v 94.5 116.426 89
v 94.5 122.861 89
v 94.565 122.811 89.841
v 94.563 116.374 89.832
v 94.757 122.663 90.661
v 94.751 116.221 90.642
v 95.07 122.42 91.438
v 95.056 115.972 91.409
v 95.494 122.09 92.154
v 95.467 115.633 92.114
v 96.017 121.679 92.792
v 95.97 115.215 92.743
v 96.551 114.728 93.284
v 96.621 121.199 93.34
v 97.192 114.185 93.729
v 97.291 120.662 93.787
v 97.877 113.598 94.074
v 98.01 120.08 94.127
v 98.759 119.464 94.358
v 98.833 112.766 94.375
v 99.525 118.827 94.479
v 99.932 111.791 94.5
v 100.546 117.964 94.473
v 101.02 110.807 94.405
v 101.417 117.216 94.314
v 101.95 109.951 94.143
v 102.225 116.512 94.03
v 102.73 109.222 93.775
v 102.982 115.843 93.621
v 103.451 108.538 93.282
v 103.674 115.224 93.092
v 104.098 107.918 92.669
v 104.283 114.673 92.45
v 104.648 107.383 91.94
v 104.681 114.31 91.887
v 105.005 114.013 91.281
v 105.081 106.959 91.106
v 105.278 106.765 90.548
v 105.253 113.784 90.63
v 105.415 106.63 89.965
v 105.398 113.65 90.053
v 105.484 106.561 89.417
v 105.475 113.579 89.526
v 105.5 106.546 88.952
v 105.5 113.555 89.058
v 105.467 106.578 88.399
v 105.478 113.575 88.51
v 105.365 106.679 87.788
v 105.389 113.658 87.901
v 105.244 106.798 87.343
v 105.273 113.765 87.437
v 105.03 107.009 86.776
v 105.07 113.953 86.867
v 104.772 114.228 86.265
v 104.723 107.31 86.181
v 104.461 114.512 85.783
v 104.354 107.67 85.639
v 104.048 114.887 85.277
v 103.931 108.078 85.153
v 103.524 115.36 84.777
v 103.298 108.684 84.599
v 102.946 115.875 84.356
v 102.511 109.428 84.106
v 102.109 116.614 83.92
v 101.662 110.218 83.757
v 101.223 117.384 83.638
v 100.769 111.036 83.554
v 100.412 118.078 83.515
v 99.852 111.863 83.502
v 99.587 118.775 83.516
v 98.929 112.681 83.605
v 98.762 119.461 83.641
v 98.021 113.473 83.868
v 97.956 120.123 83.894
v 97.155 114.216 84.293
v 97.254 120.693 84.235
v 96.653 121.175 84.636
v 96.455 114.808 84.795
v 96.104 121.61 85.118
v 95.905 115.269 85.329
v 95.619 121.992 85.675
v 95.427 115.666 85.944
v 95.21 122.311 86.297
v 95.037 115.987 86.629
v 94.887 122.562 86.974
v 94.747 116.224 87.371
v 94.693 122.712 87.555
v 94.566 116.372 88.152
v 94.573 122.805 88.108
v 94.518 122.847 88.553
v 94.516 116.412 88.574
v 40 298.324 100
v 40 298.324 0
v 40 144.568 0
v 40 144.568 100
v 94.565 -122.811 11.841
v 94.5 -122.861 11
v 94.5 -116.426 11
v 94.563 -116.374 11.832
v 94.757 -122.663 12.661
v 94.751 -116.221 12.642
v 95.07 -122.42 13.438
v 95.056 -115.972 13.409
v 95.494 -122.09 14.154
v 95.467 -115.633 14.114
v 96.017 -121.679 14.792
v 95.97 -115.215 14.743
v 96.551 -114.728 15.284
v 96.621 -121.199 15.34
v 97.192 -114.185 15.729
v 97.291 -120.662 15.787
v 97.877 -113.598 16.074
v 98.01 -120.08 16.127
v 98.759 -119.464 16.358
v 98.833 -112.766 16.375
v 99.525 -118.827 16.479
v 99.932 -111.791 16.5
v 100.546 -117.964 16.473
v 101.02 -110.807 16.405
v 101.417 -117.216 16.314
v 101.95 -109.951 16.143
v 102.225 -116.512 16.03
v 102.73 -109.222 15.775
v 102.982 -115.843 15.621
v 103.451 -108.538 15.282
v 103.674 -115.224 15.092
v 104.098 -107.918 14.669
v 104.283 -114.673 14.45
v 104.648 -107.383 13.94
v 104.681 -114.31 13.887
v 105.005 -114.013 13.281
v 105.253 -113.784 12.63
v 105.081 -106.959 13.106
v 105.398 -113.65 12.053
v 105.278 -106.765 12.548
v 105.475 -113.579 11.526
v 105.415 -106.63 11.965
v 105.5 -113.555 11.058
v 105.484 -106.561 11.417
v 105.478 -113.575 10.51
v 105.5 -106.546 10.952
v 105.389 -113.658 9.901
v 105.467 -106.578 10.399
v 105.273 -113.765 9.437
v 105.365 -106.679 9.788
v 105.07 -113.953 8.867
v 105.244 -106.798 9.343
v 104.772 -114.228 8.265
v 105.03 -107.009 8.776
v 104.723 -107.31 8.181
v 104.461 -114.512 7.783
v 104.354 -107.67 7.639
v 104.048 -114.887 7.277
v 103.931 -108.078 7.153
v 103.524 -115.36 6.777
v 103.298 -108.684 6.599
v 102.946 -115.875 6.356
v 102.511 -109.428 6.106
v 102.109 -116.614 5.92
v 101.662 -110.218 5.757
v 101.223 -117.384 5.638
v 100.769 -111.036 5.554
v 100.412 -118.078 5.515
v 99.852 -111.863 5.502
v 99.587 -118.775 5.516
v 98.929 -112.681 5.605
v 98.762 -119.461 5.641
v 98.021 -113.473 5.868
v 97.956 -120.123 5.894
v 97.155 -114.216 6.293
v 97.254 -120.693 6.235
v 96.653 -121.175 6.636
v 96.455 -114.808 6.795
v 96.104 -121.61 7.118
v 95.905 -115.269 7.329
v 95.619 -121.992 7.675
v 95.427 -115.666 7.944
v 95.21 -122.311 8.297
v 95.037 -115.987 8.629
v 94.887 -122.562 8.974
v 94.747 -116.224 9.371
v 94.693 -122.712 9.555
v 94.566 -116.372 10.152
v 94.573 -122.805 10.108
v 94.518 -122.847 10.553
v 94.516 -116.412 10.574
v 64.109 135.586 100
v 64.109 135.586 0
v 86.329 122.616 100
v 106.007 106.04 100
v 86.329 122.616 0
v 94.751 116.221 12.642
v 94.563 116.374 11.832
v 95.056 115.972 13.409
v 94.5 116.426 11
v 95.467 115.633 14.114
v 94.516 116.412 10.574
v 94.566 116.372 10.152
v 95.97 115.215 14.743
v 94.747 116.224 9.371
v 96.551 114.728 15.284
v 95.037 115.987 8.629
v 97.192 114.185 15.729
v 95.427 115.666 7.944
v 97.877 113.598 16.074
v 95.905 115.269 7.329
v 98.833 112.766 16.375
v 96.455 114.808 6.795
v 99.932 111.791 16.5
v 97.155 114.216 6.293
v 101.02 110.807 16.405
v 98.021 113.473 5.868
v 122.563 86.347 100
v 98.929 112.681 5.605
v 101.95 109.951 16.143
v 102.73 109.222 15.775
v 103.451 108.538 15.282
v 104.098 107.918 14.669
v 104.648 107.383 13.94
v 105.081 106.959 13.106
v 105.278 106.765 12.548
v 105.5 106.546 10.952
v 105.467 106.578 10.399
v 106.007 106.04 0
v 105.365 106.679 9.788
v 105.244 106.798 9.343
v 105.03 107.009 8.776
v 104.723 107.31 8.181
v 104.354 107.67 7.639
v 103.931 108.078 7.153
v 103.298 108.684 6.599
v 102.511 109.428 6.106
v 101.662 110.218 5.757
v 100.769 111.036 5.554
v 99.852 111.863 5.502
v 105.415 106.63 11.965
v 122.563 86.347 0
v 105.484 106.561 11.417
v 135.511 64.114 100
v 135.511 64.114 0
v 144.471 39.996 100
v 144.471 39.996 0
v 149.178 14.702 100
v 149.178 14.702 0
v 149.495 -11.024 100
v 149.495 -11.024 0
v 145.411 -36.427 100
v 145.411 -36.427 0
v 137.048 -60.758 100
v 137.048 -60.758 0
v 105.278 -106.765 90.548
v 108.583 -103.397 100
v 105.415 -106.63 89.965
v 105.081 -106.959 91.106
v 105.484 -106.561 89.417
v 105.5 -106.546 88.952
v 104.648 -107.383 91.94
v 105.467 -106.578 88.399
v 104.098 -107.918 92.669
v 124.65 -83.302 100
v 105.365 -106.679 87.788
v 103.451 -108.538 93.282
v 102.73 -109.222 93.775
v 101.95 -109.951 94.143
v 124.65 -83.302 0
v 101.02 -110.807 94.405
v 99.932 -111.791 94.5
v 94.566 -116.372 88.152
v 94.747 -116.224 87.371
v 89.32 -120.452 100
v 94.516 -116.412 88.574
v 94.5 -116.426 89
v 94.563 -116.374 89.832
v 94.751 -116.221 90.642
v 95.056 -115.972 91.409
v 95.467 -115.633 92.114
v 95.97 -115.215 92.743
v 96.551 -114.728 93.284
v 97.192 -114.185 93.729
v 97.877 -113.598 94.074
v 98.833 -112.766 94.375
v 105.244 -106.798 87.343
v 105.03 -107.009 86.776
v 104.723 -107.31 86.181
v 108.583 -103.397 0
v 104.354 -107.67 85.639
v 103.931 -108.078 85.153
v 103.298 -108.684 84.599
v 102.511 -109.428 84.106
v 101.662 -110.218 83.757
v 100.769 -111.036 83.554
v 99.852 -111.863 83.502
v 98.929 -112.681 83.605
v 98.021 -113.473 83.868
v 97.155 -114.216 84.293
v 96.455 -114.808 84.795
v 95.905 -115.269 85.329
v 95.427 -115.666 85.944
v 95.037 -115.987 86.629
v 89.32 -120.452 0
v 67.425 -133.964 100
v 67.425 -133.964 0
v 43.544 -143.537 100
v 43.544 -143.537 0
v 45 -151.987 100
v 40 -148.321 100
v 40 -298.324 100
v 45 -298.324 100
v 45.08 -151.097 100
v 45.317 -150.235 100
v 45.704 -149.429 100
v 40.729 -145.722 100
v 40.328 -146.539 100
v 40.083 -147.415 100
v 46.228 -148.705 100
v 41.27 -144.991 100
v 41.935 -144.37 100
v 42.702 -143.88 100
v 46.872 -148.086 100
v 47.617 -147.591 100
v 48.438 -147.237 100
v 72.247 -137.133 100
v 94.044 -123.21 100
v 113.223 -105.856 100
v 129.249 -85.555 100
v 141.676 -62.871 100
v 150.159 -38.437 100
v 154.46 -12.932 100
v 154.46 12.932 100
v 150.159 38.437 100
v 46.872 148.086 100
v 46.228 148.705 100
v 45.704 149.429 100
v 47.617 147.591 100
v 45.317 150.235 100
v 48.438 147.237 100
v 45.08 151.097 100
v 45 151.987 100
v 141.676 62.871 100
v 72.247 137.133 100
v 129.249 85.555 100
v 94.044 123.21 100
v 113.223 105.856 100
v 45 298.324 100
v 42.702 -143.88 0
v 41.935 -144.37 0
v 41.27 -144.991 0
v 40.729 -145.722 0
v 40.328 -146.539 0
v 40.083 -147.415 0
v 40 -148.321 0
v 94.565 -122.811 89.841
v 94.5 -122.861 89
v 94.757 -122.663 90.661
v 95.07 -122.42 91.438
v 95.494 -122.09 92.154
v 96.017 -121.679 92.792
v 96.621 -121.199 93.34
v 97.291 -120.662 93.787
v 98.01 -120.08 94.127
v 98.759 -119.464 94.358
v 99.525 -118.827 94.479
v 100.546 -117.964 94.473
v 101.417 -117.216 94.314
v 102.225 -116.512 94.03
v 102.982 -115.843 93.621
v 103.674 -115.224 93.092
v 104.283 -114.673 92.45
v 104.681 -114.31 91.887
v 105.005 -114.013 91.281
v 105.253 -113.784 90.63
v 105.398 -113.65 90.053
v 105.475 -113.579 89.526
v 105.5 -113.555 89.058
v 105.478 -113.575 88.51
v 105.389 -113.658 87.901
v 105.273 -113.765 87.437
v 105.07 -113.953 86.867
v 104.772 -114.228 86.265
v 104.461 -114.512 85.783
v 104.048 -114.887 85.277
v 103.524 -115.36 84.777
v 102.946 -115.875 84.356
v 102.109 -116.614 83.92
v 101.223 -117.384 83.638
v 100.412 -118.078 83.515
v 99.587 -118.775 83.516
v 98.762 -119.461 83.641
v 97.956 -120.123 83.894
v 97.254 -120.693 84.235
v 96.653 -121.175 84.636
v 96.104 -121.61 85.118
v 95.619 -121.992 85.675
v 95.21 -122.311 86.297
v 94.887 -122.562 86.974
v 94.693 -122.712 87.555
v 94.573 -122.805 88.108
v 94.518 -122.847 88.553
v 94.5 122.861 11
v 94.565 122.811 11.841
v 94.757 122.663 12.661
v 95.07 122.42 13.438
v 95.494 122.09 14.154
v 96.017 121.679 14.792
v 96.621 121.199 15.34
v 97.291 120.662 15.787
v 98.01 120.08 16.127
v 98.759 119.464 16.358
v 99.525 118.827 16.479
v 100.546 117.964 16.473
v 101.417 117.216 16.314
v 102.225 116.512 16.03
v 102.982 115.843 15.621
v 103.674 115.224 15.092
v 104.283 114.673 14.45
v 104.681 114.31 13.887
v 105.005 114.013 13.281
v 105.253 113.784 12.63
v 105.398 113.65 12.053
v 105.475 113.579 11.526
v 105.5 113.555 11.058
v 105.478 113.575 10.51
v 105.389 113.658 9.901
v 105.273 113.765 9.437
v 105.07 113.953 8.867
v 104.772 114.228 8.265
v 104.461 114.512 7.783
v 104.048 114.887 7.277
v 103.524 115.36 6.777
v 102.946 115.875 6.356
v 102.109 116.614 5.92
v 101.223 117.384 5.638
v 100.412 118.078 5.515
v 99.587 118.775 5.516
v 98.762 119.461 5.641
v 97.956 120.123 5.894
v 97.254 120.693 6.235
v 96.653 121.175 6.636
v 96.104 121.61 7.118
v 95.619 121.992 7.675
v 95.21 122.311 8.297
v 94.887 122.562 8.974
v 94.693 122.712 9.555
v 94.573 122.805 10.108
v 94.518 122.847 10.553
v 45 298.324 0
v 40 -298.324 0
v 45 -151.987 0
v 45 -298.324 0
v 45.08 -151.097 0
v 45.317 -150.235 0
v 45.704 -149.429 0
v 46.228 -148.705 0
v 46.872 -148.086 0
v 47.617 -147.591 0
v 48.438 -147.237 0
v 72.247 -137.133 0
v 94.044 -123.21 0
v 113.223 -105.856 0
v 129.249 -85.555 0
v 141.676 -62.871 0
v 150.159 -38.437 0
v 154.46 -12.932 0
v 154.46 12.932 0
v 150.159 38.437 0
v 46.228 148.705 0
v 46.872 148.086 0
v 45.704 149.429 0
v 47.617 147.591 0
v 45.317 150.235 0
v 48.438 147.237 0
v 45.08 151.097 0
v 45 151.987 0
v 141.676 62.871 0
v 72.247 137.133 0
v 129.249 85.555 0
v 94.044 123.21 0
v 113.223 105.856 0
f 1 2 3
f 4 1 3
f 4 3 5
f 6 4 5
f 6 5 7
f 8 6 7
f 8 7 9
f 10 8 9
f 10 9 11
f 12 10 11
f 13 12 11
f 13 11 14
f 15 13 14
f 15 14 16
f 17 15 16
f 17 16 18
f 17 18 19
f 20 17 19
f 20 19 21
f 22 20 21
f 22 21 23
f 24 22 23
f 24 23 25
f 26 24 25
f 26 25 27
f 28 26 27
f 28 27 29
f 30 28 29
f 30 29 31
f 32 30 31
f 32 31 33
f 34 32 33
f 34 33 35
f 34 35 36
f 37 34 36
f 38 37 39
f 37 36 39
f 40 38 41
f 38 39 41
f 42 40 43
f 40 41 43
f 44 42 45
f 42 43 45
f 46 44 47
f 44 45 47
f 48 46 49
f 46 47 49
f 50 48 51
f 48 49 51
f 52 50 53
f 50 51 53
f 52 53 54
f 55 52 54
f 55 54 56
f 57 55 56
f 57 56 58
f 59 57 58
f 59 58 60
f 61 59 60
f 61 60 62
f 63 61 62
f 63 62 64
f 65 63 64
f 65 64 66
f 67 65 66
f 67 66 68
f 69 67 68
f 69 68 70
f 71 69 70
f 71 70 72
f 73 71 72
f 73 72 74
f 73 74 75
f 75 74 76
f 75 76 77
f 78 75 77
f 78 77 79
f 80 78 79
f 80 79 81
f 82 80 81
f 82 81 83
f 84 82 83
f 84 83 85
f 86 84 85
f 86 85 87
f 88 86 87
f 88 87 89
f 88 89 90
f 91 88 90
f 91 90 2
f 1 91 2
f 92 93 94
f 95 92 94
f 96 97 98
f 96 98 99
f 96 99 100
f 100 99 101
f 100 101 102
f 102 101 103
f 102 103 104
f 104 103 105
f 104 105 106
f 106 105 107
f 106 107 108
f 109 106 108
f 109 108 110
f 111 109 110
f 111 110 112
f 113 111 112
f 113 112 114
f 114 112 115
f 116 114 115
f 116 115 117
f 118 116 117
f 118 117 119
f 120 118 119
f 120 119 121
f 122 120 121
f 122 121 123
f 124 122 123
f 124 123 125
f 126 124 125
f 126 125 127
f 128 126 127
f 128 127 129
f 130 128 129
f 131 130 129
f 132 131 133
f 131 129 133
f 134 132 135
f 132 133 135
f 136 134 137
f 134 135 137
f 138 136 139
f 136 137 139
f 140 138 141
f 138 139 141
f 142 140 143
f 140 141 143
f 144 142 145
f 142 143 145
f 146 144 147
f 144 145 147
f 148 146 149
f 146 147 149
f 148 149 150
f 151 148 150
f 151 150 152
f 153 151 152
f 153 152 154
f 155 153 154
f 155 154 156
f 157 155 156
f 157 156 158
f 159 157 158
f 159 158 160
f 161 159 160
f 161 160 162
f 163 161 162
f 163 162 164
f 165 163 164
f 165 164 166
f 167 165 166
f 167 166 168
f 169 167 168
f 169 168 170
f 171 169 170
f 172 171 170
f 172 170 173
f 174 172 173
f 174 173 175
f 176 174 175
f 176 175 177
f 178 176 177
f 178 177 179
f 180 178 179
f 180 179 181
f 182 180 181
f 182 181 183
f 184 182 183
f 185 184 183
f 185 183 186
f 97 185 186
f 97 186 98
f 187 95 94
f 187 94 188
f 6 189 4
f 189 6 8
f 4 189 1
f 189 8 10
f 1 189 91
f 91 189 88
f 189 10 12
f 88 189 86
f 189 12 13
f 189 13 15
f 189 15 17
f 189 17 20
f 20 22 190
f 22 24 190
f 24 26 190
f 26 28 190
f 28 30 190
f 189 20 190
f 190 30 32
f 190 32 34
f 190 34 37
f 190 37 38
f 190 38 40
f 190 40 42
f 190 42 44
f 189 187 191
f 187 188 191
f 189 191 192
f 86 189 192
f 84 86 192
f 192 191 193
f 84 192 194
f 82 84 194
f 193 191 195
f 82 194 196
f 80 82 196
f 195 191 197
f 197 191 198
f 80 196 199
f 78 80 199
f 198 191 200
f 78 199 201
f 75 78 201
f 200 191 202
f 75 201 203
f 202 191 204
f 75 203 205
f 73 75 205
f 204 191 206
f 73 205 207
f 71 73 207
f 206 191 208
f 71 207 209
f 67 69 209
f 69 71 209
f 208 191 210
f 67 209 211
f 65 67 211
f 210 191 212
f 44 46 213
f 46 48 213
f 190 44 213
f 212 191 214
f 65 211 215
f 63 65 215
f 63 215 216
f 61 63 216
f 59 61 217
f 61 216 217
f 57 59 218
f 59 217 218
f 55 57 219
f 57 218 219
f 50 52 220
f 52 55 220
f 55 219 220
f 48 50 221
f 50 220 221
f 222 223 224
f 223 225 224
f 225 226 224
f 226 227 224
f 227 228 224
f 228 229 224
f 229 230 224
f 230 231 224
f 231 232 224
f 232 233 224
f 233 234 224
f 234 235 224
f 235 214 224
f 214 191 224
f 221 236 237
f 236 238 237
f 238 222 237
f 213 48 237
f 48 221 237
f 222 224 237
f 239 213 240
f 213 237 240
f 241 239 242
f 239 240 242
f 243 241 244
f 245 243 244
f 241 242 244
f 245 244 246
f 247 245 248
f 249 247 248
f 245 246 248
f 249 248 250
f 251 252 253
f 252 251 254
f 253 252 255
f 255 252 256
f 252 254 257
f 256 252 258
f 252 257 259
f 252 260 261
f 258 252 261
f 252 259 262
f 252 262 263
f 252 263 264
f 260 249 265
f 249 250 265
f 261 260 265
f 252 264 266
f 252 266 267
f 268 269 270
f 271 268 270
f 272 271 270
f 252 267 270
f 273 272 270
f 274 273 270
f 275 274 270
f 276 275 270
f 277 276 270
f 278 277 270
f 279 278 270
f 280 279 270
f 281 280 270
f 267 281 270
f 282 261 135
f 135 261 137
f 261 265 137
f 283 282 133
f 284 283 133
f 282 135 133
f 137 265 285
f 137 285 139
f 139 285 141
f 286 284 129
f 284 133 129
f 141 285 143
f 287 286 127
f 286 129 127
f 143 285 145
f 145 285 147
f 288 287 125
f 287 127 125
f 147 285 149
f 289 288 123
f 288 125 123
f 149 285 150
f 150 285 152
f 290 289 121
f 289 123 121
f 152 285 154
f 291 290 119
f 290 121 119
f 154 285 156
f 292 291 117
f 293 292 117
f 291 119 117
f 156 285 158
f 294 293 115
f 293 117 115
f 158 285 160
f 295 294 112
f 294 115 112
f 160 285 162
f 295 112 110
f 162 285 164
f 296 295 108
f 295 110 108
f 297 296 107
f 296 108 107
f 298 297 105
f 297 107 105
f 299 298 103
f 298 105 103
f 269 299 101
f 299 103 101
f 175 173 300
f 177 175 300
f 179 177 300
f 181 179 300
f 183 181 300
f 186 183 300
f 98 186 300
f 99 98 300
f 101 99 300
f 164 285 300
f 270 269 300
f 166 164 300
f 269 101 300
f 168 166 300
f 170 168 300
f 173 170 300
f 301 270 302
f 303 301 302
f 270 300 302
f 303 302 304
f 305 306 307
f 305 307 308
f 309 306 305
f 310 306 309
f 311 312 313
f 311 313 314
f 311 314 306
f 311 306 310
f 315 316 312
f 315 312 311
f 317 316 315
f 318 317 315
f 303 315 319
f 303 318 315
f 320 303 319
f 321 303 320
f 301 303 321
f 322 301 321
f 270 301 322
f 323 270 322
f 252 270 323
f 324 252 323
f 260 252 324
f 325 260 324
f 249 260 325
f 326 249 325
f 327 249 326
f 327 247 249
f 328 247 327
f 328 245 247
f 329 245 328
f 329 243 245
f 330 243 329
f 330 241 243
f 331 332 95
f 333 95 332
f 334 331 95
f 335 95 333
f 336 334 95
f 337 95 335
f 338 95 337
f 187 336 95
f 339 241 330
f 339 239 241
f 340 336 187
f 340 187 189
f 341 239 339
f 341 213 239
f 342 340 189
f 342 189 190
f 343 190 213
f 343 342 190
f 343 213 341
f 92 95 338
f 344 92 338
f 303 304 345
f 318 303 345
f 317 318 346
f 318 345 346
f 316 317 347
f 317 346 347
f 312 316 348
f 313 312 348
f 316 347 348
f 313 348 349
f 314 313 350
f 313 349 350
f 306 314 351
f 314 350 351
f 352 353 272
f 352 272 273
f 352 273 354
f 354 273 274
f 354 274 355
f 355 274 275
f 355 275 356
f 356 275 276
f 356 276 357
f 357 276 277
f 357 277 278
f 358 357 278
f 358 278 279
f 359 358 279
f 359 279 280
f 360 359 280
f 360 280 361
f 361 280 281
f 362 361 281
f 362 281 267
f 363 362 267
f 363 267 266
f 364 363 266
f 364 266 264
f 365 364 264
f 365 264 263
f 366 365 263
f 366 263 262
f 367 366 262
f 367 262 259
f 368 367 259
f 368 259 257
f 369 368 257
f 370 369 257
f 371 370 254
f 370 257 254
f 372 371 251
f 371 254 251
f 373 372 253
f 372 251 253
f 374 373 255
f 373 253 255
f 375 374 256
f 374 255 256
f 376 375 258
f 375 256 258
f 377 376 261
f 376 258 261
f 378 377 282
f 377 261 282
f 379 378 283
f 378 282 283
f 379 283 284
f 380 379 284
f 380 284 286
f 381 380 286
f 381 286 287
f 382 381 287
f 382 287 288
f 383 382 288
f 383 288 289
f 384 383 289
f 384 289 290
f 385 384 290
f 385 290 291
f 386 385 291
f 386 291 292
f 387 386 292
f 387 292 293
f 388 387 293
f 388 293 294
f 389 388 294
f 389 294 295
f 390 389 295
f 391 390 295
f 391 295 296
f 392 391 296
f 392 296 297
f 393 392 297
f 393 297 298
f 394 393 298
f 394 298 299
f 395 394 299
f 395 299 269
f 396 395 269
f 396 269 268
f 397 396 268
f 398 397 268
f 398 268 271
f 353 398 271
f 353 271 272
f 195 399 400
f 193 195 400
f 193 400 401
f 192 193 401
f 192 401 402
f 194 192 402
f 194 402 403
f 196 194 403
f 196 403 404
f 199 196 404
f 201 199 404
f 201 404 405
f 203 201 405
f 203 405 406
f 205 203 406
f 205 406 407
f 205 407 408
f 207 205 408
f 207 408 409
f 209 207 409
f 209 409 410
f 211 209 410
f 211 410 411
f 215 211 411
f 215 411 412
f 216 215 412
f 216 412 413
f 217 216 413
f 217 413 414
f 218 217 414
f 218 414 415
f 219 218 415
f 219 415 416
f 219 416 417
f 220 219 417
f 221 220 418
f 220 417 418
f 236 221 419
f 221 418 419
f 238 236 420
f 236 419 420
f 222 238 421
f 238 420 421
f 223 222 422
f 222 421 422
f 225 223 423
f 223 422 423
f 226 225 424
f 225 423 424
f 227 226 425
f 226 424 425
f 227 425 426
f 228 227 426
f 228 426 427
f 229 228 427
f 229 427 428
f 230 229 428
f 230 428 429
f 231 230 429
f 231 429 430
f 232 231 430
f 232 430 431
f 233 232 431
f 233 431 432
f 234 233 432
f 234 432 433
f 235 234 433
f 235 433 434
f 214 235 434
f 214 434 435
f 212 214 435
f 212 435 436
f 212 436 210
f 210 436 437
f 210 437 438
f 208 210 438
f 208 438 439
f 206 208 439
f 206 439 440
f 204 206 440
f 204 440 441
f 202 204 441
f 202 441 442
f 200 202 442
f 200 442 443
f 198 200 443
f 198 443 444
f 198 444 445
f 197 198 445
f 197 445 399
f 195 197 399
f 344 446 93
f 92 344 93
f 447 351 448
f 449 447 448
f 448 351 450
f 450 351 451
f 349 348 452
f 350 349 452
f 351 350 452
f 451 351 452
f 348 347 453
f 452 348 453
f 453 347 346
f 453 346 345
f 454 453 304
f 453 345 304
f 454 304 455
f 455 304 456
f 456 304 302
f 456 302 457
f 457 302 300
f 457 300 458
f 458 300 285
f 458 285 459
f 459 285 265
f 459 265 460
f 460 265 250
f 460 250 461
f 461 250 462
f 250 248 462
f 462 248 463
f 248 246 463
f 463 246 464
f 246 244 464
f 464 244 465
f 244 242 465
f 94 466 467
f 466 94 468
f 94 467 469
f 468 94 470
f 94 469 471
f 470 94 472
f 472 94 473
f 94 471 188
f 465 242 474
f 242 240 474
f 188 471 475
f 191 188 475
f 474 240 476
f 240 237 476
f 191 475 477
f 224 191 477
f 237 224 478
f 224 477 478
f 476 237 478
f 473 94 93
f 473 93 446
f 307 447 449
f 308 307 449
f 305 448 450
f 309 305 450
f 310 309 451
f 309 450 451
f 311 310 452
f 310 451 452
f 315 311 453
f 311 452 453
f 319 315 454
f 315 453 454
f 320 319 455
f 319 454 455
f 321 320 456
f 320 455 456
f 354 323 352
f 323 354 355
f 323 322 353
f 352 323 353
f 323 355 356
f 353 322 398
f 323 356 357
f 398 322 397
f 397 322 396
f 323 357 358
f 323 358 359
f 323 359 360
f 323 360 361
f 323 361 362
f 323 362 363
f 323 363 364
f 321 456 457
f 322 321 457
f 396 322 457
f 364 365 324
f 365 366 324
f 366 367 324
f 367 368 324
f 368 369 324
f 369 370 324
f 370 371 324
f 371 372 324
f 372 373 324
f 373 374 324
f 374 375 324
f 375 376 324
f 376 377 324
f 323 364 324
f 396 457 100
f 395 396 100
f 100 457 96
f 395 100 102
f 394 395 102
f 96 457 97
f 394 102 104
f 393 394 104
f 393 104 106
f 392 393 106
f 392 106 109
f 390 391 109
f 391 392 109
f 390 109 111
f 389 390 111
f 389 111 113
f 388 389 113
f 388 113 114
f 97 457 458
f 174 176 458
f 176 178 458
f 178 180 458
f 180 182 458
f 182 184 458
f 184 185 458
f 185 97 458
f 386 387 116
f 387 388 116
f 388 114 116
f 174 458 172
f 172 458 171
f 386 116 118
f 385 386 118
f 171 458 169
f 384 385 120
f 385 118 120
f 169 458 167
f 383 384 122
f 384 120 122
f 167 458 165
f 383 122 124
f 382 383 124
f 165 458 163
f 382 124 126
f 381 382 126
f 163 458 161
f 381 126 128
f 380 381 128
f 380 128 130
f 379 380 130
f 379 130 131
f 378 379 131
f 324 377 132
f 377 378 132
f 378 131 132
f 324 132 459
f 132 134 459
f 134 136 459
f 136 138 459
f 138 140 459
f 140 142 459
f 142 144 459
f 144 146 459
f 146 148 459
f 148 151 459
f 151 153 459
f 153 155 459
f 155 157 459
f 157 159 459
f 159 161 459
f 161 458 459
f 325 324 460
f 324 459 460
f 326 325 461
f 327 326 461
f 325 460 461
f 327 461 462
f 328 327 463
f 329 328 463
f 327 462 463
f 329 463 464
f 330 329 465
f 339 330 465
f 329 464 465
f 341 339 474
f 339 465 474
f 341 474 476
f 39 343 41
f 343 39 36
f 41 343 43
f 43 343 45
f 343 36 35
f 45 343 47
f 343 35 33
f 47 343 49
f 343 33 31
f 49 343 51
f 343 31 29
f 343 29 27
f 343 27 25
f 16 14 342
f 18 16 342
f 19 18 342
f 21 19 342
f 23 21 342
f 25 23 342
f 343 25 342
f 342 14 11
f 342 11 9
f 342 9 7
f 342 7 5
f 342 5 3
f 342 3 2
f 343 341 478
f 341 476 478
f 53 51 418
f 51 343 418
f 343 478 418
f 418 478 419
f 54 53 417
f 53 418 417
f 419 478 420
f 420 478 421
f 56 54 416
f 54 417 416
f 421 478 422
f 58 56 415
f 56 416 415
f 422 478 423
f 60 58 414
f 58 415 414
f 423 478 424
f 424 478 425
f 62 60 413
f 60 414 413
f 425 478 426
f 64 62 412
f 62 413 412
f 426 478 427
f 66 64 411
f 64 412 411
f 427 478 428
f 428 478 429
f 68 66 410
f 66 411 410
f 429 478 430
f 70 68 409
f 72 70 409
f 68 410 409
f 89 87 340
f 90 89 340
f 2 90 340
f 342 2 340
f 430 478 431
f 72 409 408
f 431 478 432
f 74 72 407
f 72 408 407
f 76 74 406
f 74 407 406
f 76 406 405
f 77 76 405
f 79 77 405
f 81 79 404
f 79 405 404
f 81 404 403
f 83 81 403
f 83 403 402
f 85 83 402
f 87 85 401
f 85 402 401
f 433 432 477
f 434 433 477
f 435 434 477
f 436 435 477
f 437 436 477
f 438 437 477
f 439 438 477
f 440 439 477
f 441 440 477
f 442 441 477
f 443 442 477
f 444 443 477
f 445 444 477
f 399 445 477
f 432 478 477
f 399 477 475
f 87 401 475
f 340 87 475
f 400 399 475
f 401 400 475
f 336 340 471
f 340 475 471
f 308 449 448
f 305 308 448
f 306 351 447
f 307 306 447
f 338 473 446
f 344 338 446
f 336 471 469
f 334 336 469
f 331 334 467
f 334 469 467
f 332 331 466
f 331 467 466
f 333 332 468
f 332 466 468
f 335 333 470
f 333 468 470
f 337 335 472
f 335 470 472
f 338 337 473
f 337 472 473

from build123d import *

# Parameters (mm, degrees)
F1_DEPTH = 100
F3_D     = 11


with BuildPart() as f1:
    # F0 (on Top) → F1 (new body)
    with BuildSketch(Plane.XY):
        with BuildLine():
            Line((45, -298.3239697419), (45, -151.9868415357))
            ThreePointArc((45, -151.9868415357), (45.9495370635, -149.0553316858), (48.4375, -147.2372527377))
            ThreePointArc((48.4375, -147.2372527377), (155, 0), (48.4375, 147.2372527377))
            ThreePointArc((48.4375, 147.2372527377), (45.9495370635, 149.0553316858), (45, 151.9868415357))
            Line((45, 151.9868415357), (45, 298.3239697419))
            Line((45, 298.3239697419), (40, 298.3239697419))
            Line((40, 298.3239697419), (40, 144.568322948))
            ThreePointArc((40, 144.568322948), (149.8888164954, 1.8456395549), (43.5443348323, -143.5371914998))
            ThreePointArc((43.5443348323, -143.5371914998), (40.9826422963, -145.343888573), (40, -148.3206043943))
            Line((40, -148.3206043943), (40, -298.3239697419))
            Line((40, -298.3239697419), (45, -298.3239697419))
        make_face()
    extrude(amount=F1_DEPTH)

    # F3 (through all)
    with Locations(Plane.XZ.offset(298.3239697419)):
        with Locations((100, 89), (100, 11)):
            Hole(F3_D / 2)


solid = f1.part
